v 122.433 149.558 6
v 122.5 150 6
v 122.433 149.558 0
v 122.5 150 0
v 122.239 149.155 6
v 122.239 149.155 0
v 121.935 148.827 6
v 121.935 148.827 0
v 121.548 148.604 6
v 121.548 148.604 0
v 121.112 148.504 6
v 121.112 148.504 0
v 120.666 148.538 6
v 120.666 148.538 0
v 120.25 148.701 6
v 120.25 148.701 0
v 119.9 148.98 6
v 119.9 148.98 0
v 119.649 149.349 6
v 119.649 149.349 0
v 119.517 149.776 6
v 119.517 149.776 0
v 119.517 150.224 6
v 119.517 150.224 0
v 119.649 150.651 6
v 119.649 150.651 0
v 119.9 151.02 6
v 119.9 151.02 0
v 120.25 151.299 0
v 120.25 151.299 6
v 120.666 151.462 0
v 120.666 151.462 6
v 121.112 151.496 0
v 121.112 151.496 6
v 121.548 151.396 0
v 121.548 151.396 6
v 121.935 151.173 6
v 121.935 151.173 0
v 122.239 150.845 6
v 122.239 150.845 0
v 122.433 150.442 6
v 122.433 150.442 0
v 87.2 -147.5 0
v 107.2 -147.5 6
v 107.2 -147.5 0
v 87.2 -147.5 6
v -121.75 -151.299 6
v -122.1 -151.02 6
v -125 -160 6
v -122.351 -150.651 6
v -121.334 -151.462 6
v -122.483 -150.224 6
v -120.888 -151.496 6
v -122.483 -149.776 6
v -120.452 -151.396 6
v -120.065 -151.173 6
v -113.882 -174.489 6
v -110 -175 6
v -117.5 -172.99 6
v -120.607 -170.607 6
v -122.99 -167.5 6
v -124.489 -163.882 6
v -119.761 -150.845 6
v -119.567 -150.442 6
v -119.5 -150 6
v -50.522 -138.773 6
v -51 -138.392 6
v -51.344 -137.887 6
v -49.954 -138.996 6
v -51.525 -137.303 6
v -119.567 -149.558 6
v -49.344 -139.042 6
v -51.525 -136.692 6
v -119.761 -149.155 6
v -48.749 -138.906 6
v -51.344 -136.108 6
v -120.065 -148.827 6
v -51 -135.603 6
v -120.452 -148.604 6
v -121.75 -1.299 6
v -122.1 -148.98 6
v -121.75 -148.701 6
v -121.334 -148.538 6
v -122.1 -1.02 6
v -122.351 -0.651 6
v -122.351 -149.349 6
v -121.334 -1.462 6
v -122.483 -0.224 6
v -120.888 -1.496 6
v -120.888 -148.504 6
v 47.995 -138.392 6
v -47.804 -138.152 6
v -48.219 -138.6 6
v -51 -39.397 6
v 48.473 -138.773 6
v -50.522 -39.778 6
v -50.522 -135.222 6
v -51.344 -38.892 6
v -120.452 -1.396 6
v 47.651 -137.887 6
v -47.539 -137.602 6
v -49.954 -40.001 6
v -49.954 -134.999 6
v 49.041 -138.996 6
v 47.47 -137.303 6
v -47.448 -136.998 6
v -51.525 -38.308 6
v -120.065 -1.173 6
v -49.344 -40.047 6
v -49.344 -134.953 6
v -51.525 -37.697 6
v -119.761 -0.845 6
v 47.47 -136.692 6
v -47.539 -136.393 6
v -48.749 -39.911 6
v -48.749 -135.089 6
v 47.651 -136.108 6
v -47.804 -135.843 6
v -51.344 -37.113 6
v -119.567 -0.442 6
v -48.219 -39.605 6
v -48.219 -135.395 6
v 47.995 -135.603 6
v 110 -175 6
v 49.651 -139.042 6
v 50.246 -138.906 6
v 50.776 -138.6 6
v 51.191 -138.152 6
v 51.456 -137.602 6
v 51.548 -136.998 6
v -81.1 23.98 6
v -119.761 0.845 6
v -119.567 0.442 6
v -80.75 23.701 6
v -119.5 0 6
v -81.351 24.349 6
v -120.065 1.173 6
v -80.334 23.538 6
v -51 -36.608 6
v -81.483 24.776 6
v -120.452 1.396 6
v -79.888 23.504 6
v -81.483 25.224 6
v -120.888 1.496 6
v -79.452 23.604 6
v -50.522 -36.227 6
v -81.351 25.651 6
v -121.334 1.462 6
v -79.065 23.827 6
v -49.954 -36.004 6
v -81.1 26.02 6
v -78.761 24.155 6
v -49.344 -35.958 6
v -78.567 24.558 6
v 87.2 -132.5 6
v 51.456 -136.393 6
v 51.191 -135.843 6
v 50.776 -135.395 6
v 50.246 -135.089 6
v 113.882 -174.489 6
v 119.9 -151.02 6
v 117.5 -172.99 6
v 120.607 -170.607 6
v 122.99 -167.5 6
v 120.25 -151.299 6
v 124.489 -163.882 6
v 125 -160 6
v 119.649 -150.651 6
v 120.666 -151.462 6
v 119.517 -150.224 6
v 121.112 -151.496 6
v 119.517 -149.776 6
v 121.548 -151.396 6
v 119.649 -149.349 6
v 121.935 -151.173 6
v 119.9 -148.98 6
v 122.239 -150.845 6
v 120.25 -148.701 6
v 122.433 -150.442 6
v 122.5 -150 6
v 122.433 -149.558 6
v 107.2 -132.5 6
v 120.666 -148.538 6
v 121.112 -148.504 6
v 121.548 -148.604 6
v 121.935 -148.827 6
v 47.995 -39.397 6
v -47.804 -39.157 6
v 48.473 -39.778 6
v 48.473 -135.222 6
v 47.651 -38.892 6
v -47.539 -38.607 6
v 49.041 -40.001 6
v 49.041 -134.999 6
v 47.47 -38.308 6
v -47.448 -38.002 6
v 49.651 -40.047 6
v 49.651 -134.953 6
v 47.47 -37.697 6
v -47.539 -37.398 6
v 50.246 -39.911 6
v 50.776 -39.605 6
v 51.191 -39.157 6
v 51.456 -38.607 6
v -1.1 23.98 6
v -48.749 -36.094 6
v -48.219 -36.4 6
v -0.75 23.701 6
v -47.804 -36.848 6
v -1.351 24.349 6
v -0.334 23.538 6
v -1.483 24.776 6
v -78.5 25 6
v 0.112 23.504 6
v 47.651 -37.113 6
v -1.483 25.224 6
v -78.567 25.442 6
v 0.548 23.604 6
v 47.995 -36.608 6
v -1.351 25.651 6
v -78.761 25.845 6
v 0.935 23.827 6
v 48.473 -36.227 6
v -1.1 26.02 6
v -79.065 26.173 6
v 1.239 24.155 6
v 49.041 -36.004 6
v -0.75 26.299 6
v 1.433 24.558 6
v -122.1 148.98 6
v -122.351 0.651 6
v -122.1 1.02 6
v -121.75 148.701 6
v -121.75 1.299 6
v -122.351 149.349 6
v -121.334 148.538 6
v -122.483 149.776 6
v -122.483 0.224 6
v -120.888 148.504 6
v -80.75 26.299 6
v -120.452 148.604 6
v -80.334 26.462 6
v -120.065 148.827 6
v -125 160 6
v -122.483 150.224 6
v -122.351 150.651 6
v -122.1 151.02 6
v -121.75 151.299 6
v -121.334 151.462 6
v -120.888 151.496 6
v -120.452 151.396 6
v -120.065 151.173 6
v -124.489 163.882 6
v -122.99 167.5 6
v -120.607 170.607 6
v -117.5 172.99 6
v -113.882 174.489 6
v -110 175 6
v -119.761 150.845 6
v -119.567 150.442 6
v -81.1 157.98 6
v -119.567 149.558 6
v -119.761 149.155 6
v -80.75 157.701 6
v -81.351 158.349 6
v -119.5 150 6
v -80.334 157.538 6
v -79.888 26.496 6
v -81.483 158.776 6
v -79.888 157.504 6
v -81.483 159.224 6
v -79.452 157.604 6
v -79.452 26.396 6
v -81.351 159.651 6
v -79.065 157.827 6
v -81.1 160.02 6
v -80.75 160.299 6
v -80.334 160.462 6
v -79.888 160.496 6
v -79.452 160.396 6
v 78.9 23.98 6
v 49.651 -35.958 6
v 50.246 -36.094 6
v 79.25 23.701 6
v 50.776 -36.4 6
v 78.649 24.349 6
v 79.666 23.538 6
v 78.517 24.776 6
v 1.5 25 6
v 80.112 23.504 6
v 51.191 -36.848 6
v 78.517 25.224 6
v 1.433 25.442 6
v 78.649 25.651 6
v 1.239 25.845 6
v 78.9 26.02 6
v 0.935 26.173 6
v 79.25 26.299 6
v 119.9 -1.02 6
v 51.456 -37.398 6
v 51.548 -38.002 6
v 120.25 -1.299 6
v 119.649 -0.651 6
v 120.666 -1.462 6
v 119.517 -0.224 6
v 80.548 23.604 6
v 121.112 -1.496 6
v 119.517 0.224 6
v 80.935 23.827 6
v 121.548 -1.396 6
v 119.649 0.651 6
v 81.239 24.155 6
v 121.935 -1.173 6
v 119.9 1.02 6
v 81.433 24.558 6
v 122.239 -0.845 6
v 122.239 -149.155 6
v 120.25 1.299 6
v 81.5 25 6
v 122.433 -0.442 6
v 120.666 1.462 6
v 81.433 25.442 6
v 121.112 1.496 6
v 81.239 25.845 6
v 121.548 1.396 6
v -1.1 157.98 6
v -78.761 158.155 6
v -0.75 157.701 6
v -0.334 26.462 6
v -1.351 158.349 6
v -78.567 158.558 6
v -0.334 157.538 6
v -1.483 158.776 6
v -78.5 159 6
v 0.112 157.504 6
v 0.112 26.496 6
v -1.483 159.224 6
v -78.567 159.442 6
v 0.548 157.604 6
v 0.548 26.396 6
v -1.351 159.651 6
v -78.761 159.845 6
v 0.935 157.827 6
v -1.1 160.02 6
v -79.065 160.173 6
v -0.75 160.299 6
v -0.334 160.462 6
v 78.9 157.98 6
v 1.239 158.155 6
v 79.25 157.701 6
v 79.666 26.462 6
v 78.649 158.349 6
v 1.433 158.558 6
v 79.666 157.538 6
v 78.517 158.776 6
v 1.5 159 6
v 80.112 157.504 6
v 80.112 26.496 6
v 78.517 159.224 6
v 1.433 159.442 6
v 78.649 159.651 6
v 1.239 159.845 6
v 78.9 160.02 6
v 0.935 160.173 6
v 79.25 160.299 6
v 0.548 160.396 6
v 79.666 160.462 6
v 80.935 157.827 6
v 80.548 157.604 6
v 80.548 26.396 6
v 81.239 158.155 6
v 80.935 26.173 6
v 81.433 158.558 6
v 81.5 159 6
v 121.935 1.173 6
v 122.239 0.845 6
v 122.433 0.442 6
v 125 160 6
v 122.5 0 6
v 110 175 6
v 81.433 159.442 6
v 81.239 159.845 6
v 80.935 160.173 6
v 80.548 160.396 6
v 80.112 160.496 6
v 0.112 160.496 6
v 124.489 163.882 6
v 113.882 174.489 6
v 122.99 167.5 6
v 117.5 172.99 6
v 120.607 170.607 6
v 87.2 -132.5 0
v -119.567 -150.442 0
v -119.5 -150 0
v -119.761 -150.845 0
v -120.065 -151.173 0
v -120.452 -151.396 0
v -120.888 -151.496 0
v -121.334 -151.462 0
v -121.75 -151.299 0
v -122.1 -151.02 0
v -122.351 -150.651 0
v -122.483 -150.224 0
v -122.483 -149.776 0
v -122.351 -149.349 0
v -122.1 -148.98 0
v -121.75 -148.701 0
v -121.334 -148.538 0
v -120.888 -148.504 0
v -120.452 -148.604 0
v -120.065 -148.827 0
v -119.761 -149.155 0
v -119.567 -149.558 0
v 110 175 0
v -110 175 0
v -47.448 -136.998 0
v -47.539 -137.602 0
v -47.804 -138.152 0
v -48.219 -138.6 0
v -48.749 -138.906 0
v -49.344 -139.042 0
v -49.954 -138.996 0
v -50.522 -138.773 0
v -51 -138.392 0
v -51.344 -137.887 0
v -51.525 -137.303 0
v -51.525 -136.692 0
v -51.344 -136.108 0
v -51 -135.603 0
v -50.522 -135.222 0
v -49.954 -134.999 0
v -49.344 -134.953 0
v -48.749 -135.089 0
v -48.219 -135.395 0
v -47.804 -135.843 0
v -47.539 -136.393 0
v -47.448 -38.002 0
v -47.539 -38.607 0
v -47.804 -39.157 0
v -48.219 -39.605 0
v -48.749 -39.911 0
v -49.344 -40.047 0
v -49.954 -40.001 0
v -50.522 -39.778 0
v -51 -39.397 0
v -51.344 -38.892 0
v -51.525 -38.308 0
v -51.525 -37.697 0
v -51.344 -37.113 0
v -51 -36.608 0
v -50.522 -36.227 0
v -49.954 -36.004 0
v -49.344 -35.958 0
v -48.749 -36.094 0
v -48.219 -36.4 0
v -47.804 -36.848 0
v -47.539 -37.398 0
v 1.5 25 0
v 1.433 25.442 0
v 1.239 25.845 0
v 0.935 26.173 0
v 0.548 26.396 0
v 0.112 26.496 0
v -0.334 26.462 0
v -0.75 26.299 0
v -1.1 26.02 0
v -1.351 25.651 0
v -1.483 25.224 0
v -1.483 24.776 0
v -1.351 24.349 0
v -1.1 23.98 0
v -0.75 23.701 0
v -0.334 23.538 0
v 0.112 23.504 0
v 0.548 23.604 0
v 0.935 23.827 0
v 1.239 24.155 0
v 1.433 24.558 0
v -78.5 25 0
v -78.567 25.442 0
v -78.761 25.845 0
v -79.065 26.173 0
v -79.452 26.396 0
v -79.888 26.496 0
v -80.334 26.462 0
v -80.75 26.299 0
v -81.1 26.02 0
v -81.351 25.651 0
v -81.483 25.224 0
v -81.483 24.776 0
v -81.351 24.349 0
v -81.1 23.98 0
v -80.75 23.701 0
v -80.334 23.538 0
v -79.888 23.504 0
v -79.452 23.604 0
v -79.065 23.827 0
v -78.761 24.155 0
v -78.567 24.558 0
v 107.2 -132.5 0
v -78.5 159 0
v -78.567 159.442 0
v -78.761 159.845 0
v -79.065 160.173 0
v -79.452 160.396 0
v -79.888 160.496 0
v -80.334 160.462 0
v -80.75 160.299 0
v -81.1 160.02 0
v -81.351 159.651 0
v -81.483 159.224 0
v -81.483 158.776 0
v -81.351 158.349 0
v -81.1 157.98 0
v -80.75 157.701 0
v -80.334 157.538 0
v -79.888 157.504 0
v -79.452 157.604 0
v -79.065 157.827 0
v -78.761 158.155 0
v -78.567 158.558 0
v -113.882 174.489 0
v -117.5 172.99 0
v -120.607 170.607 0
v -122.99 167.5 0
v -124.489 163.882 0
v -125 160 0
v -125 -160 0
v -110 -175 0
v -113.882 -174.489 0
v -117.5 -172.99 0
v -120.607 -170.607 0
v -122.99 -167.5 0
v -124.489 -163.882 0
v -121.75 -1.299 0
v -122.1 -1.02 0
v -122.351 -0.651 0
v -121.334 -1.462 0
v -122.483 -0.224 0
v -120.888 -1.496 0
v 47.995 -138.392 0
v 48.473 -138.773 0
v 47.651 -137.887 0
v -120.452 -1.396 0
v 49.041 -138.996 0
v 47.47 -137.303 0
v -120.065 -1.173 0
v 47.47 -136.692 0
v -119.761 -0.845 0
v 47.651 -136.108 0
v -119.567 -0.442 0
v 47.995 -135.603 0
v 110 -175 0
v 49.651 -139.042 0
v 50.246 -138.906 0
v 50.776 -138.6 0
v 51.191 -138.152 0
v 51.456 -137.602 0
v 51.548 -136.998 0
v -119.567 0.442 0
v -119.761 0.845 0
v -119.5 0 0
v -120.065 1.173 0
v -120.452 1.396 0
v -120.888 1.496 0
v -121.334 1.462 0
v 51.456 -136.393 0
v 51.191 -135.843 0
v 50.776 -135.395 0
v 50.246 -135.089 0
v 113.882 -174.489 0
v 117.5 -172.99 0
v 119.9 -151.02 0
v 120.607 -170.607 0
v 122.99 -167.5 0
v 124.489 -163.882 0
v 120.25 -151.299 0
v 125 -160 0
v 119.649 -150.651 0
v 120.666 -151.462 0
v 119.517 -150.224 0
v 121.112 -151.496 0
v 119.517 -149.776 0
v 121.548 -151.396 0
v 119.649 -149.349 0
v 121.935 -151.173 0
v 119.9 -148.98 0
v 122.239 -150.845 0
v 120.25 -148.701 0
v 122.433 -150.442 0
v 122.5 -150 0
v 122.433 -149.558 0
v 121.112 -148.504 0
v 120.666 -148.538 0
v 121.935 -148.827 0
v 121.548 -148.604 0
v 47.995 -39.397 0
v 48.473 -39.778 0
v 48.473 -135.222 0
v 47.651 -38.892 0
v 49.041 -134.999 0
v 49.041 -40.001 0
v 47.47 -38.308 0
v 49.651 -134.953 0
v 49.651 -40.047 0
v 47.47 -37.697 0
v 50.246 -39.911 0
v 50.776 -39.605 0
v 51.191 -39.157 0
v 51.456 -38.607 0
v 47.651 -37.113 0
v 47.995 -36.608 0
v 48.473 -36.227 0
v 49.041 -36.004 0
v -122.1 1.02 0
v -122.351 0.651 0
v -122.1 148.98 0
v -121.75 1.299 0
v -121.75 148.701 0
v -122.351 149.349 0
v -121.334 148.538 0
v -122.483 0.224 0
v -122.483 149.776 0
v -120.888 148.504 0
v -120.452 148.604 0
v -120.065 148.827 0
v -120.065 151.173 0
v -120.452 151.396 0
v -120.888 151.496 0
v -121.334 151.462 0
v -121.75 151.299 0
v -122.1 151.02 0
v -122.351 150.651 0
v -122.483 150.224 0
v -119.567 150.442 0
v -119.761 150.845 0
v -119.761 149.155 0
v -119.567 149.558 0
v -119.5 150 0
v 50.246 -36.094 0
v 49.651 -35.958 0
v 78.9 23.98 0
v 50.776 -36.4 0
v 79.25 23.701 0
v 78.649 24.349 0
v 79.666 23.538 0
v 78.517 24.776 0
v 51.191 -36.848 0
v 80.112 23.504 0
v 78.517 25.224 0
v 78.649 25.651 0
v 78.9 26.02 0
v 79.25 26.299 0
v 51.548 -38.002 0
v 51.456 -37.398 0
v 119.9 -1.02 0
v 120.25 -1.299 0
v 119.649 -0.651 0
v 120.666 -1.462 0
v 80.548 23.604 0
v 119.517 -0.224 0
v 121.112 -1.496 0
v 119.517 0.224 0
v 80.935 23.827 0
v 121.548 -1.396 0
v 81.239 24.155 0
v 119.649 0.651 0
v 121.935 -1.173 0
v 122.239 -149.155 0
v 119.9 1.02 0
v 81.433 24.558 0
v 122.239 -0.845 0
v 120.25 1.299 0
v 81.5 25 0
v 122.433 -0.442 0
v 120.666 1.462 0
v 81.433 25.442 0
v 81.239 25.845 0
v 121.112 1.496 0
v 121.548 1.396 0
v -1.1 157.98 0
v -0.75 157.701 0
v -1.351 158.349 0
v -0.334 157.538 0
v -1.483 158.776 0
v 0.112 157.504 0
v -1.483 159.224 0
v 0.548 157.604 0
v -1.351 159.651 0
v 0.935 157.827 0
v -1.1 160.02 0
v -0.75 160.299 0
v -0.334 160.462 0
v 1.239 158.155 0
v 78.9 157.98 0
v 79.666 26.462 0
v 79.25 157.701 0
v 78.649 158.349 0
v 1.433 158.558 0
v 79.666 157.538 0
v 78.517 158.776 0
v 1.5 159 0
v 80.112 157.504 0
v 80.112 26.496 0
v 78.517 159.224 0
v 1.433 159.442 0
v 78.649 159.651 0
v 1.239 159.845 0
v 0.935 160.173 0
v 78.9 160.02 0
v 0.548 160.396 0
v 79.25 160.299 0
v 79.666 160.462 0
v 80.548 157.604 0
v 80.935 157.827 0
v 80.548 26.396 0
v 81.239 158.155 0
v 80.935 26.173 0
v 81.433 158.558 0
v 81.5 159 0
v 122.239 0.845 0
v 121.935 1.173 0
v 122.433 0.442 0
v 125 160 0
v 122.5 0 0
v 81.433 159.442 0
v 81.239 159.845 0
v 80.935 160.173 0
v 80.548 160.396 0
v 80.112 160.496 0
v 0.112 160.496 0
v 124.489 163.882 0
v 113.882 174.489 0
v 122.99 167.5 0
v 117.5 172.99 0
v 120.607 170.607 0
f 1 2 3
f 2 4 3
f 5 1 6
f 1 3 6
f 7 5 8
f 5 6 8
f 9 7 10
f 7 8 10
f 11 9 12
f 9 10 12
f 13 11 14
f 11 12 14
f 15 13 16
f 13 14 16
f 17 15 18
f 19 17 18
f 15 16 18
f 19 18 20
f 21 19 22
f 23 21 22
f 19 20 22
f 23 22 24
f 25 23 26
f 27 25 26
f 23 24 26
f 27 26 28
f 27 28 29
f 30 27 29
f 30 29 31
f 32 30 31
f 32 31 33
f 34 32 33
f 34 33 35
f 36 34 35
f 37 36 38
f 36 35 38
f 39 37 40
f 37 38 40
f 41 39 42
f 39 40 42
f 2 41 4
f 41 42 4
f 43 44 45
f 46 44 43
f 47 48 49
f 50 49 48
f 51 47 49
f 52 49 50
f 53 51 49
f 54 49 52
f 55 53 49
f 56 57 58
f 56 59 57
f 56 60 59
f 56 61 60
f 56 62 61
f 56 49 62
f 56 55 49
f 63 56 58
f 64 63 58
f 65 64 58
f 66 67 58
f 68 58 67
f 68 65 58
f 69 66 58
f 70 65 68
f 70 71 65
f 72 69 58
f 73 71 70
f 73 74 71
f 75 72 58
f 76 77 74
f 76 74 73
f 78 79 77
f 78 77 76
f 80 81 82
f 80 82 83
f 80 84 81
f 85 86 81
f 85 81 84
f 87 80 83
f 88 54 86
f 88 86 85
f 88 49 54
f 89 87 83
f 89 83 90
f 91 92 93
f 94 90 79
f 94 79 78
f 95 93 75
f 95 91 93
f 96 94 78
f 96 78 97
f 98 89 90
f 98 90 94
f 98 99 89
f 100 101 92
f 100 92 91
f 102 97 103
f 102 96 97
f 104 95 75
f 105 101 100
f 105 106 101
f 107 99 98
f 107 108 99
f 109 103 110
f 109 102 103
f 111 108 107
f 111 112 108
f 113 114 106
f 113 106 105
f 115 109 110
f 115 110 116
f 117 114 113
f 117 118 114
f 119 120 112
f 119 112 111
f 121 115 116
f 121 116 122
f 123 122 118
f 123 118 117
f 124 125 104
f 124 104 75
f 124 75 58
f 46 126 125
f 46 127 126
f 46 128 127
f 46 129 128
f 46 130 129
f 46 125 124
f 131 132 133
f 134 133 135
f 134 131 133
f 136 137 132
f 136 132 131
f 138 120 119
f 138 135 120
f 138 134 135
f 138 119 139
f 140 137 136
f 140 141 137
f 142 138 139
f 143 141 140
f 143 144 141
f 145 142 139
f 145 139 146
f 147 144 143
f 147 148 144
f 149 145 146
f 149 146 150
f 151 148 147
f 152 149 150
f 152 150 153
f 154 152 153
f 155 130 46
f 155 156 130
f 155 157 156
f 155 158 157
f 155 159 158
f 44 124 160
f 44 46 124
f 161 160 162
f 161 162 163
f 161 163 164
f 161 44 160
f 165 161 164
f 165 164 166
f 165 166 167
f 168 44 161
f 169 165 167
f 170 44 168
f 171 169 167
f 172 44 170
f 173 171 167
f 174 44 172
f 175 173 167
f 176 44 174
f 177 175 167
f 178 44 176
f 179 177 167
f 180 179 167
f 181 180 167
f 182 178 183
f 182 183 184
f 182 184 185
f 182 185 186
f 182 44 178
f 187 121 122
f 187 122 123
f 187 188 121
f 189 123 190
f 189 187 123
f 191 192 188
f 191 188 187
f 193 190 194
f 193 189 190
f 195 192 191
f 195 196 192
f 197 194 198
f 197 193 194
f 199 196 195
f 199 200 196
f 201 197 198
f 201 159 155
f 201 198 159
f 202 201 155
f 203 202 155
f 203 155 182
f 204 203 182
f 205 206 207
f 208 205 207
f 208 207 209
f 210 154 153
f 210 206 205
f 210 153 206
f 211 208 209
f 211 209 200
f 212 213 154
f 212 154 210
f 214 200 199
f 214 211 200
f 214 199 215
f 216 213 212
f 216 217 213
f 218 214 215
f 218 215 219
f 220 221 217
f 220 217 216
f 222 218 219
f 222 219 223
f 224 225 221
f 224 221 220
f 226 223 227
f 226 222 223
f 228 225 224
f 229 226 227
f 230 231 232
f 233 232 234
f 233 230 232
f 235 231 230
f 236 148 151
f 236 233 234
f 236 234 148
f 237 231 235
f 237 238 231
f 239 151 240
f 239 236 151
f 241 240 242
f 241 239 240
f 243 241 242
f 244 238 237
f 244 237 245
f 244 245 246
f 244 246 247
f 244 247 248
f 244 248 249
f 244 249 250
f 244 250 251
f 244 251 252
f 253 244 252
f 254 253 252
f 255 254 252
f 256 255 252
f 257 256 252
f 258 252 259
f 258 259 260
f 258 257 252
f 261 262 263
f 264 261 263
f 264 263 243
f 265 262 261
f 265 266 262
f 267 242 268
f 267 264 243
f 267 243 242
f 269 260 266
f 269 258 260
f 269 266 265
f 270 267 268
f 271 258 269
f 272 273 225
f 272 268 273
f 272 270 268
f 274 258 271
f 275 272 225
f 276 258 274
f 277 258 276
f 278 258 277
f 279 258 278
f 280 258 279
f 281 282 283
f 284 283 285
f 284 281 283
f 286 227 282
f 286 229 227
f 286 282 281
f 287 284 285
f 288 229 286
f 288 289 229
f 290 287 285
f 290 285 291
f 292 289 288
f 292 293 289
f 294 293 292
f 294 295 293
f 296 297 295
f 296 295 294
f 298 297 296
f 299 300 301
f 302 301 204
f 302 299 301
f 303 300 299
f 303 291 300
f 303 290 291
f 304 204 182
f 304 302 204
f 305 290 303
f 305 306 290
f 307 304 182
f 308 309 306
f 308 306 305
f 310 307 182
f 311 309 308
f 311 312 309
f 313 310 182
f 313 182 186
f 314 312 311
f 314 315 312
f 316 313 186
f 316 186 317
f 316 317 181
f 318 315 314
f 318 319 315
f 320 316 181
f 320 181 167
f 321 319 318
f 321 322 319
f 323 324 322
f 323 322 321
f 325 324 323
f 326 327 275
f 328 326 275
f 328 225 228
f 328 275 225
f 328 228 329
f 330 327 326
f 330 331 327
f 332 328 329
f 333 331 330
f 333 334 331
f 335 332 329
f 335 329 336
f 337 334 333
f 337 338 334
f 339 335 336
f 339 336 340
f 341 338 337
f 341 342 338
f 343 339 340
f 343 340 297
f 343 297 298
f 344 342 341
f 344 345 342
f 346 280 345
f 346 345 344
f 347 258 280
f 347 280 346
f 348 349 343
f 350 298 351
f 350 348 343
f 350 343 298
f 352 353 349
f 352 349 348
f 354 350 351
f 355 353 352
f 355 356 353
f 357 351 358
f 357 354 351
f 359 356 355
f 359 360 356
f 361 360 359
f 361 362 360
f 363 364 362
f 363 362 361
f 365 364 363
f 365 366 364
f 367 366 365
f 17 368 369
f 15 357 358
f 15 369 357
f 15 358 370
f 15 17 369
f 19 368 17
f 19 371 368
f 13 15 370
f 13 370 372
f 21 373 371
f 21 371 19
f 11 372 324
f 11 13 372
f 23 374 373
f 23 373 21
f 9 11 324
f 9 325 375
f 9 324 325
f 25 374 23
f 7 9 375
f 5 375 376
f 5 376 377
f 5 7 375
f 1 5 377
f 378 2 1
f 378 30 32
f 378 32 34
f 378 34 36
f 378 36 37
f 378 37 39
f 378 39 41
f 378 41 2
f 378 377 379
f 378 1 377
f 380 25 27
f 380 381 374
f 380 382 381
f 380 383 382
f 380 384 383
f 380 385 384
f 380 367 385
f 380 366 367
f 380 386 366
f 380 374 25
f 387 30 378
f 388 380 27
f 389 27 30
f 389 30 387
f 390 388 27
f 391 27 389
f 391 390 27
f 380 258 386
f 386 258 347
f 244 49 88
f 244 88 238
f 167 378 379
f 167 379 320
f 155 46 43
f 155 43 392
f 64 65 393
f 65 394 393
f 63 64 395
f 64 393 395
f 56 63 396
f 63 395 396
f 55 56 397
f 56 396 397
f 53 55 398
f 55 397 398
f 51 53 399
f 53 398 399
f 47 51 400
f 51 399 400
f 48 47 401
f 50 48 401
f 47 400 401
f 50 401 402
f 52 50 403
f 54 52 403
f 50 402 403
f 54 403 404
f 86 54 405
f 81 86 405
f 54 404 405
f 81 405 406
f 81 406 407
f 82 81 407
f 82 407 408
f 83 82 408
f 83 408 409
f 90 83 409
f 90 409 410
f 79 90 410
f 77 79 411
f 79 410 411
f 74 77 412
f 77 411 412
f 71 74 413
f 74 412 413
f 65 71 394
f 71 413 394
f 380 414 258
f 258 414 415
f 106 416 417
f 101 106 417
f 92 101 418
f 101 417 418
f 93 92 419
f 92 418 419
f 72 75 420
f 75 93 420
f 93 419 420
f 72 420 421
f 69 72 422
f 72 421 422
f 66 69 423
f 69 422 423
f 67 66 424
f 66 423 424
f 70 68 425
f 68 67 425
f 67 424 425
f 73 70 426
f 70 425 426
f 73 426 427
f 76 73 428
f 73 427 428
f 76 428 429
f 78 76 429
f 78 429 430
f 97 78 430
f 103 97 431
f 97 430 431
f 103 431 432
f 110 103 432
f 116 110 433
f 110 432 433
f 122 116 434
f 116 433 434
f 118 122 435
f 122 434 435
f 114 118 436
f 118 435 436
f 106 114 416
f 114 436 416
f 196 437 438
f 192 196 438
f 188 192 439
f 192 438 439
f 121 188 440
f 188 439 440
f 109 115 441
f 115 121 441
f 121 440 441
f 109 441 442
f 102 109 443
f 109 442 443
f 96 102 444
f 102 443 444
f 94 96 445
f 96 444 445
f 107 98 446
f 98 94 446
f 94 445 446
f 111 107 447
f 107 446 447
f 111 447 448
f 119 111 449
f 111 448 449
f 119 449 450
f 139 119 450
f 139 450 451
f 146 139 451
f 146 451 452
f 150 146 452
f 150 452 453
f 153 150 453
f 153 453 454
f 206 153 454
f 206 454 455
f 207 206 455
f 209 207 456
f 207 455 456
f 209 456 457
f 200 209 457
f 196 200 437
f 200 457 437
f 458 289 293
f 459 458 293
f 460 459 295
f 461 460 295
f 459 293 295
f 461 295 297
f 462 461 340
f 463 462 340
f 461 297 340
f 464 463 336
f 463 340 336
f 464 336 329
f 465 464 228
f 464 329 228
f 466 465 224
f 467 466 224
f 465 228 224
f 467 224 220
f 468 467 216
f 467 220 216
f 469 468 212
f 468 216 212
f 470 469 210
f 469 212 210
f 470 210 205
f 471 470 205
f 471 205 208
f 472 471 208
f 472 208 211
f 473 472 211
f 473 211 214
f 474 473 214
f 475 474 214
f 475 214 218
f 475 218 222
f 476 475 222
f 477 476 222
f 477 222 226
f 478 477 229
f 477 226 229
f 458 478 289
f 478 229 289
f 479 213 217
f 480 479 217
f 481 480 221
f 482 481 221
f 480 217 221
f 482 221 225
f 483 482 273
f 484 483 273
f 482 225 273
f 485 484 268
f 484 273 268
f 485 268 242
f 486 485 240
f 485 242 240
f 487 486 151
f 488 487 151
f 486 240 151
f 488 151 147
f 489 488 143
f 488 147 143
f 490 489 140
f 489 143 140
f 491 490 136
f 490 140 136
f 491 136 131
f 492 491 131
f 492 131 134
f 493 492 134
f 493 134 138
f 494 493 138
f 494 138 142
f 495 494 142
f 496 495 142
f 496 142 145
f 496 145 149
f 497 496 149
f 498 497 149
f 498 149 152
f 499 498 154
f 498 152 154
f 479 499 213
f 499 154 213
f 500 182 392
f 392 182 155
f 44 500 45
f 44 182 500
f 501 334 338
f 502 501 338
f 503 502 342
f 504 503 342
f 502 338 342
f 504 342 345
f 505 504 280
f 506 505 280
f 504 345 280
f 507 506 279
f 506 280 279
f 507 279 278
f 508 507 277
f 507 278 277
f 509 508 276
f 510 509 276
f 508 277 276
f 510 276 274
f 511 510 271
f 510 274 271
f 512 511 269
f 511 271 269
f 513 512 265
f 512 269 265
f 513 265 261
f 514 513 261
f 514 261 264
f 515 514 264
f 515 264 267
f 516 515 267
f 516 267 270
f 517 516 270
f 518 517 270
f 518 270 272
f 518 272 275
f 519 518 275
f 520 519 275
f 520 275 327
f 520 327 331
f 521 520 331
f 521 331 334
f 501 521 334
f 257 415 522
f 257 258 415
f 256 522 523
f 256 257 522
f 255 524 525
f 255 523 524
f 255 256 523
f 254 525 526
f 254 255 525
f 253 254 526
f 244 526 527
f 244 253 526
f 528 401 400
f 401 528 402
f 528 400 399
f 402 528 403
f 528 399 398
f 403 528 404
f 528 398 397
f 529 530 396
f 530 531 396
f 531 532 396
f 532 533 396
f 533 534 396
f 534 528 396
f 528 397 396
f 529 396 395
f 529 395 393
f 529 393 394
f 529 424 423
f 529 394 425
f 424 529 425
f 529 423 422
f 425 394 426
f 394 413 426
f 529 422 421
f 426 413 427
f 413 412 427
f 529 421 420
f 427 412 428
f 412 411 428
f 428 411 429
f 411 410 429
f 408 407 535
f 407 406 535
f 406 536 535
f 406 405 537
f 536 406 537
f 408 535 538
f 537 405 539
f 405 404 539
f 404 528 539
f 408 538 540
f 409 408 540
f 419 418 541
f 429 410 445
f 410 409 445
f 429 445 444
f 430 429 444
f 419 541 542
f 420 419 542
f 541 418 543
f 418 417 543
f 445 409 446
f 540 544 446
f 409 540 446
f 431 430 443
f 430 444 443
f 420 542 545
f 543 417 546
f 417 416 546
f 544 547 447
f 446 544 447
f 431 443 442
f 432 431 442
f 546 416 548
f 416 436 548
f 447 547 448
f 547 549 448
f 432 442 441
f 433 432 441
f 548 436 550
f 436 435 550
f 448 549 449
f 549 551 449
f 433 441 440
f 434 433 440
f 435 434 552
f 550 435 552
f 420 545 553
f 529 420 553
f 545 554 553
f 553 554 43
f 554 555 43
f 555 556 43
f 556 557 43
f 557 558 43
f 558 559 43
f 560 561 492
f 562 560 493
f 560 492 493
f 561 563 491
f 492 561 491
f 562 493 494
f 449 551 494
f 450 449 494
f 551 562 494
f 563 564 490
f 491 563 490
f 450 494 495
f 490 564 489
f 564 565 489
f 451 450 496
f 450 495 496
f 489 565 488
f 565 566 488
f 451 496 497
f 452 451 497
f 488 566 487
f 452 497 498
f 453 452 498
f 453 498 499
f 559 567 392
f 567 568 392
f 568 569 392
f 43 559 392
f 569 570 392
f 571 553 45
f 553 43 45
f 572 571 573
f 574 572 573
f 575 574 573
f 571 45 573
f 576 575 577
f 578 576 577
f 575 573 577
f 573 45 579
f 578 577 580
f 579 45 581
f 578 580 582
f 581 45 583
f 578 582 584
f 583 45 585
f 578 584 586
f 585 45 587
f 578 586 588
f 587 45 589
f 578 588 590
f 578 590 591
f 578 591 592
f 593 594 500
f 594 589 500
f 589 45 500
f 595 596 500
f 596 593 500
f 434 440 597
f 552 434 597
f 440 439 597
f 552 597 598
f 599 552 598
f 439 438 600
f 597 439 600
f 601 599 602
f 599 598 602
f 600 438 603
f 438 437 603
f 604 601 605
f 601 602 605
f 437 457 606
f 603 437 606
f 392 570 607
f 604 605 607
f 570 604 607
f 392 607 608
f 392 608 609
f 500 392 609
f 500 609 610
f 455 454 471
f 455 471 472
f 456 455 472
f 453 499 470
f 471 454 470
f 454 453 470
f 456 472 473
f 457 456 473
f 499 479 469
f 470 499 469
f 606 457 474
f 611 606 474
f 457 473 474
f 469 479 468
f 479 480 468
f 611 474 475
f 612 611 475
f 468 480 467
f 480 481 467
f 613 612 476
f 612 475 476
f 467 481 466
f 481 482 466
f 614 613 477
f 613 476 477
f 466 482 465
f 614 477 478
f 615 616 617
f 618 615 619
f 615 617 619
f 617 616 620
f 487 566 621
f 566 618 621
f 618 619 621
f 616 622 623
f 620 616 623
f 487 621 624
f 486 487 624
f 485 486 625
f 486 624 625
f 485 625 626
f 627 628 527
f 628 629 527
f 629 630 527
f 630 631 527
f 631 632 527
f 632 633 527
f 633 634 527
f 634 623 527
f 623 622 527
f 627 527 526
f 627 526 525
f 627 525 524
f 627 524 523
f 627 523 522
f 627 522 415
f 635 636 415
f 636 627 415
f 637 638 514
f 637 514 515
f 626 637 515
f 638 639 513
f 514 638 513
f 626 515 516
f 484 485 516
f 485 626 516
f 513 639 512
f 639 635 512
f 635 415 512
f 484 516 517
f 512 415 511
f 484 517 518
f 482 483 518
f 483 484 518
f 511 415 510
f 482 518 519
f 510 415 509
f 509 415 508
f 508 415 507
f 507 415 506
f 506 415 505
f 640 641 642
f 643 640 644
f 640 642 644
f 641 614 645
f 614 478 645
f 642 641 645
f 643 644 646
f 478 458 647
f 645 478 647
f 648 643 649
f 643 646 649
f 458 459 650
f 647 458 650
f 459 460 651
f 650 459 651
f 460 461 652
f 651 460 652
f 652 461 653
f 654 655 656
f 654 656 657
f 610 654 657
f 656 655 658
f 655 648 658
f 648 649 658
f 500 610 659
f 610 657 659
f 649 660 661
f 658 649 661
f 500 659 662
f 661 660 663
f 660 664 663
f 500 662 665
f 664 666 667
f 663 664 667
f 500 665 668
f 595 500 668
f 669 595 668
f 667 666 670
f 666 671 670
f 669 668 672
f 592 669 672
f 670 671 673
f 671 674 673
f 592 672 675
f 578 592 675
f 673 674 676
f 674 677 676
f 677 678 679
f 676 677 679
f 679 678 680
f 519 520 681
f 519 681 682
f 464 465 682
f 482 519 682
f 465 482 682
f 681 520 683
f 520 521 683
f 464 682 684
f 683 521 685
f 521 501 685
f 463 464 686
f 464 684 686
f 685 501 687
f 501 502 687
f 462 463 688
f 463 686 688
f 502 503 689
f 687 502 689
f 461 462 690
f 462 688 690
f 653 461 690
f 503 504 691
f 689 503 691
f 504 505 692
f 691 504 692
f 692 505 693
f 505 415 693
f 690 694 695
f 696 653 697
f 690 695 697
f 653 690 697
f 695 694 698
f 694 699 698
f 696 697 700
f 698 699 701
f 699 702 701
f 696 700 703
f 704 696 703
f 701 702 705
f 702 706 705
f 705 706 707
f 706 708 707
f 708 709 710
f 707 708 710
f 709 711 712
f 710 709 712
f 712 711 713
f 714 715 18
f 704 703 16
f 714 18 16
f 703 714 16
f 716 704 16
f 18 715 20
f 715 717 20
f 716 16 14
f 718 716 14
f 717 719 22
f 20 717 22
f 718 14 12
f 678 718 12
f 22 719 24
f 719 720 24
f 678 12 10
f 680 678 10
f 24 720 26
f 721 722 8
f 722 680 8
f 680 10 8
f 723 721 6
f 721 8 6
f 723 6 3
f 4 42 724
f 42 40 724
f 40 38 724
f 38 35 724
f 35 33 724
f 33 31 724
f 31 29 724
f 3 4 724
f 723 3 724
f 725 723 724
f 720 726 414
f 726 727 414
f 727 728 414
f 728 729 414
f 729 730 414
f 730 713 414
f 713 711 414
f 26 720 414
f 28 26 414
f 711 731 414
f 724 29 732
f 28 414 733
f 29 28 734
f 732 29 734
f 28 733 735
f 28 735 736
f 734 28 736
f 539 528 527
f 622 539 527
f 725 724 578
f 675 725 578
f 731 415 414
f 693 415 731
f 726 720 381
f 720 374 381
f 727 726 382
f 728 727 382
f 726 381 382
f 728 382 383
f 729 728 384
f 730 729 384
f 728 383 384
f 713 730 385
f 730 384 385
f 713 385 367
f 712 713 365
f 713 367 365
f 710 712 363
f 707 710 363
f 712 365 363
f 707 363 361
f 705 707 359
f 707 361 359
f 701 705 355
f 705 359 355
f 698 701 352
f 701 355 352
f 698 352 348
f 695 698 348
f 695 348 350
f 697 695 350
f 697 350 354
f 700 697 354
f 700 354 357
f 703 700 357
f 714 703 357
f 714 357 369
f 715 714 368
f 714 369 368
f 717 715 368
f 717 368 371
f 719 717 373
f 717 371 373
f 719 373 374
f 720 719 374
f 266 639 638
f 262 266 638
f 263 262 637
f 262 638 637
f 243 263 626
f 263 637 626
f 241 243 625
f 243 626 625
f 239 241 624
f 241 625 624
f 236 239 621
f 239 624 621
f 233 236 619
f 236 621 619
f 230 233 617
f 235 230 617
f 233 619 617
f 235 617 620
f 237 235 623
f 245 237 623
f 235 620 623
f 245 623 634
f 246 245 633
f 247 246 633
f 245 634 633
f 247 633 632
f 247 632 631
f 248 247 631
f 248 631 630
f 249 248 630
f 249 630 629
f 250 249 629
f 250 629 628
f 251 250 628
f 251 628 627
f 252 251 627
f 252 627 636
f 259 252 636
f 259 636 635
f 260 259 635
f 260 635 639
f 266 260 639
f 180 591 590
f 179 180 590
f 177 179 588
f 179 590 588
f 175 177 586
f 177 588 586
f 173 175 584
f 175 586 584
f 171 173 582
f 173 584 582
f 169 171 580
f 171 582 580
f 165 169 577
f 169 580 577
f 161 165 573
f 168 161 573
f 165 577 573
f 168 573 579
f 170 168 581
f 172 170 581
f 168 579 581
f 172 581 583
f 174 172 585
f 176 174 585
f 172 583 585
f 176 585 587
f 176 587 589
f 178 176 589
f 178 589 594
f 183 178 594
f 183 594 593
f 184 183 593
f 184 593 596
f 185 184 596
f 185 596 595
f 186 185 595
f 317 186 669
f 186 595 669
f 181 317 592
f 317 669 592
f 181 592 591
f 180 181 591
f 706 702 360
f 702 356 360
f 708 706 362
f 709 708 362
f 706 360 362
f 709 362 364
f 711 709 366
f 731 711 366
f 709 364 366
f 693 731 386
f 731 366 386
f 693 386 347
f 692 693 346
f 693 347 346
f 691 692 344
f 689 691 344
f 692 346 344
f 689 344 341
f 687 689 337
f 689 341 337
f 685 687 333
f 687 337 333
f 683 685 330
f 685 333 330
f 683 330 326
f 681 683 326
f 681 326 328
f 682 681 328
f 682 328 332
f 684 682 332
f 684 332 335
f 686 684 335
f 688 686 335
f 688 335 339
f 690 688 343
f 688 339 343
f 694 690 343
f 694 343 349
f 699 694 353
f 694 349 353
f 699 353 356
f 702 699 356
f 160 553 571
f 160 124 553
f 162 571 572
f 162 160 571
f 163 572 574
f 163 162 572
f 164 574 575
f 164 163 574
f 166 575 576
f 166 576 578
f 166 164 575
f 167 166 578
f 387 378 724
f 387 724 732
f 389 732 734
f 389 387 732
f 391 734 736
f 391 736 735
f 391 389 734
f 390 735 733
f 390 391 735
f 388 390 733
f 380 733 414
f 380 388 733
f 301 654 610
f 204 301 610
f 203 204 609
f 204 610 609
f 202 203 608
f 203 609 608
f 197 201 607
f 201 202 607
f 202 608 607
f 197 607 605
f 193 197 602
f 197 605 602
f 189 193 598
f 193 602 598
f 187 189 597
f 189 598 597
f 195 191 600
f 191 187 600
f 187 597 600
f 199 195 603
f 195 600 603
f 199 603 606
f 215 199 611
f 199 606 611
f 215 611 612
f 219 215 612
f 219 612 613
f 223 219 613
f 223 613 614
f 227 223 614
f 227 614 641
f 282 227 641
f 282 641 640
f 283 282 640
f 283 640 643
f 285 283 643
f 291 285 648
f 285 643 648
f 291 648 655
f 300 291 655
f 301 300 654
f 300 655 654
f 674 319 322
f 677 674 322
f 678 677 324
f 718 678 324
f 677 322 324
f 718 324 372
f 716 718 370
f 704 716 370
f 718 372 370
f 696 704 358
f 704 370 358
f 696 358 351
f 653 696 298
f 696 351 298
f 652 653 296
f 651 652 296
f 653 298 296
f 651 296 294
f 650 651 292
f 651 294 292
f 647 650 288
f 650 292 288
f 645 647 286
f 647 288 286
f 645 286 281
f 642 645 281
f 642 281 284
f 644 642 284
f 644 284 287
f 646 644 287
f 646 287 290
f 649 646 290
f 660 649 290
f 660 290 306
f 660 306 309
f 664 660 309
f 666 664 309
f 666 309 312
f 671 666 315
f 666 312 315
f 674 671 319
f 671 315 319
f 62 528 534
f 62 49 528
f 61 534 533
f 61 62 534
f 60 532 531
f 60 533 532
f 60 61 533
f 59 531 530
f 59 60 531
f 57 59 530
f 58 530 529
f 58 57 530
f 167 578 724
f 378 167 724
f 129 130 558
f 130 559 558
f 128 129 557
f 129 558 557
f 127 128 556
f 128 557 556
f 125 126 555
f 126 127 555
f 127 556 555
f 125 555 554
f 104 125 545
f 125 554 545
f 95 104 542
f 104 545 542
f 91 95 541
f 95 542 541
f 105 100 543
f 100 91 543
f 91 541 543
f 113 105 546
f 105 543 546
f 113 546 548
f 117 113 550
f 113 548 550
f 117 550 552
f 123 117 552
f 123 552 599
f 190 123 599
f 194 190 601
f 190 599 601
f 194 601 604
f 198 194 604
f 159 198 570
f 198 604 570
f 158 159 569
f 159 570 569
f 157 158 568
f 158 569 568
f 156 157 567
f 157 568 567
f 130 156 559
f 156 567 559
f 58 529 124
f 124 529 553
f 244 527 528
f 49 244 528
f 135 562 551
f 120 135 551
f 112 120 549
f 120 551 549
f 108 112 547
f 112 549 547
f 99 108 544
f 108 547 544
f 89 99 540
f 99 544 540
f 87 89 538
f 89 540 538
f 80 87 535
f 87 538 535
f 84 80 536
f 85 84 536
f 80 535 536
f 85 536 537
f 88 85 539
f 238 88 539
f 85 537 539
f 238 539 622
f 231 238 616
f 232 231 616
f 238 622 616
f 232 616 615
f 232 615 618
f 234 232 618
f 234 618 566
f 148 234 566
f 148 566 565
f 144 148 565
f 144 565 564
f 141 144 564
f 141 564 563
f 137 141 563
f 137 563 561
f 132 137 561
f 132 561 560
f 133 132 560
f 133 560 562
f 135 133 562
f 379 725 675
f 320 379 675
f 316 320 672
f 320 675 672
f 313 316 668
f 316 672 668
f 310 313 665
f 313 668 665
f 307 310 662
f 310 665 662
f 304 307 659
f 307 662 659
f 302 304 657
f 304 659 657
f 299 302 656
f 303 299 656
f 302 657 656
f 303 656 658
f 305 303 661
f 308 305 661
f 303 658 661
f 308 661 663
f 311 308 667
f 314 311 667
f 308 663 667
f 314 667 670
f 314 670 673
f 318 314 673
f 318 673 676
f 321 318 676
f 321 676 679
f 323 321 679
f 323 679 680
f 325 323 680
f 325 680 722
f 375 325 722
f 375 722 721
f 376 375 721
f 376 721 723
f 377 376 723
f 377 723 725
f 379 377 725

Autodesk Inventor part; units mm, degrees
ref_plane "YZ Plane" through (0, 0, 0) normal (1, 0, 0) x (0, 1, 0)
ref_plane "XZ Plane" through (0, 0, 0) normal (0, 1, 0) x (-1, 0, 0)
ref_plane "XY Plane" through (0, 0, 0) normal (0, 0, 1) x (1, 0, 0)
sketch "Sketch1" plane through (0, 0, 0) normal (0, 0, 1) x (1, 0, 0)
  line L0 (-125, -175) -> (125, -175)
  line L1 (125, -175) -> (125, 175)
  line L2 (125, 175) -> (-125, 175)
  line L3 (-125, 175) -> (-125, -175)
  line L4 (-125, -175) -> (125, 175) construction
  line L5 (125, -175) -> (-125, 175) construction
  line L6 (-121, -150) -> (121, -150)
  line L7 (121, -150) -> (121, 150)
  line L8 (121, 150) -> (-121, 150)
  line L9 (-121, 150) -> (-121, -150)
  line L10 (-121, -150) -> (121, 150) construction
  line L11 (121, -150) -> (-121, 150) construction
  circle A0 centre (121, 150) radius 1.5
  circle A1 centre (-121, 150) radius 1.5
  circle A2 centre (-121, -150) radius 1.5
  circle A3 centre (121, -150) radius 1.5
  circle A4 centre (-121, 0) radius 1.5
  circle A5 centre (121, 0) radius 1.5
  line L12 (0, 0) -> (0, -175)
  line L13 (-125, 0) -> (125, -175)
  line L14 (125, 0) -> (-125, -175)
  circle A6 centre (49.4975, -38.0025) radius 2.05
  circle A7 centre (-49.4975, -38.0025) radius 2.05
  circle A8 centre (49.4975, -136.9975) radius 2.05
  circle A9 centre (-49.4975, -136.9975) radius 2.05
  point P0 (121, -148.5)
  point P1 (119.5, -150)
  point P2 (119.5, 150)
  point P3 (121, 148.5)
  point P4 (-121, 148.5)
  point P5 (-119.5, 150)
  point P6 (0, -87.5)
  dimension "d0" = 250
  dimension "d1" = 350
  dimension "d10" = 242
  dimension "d11" = 300
  dimension "d12" = 3
  dimension "d13" = 3
  dimension "d14" = 3
  dimension "d15" = 3
  dimension "d16" = 3
  dimension "d17" = 3
  dimension "d24" = 4.1
  dimension "d25" = 4.1
  dimension "d26" = 4.1
  dimension "d27" = 4.1
extrude "Extrusion1" add sketch "Sketch1" along normal blind 6 contours L14 L6 L12 L0 | L3 L13 L9 A2 L6 L14 | L12 L6 L13 L0 | L3 L2 L1 L14 L7 A5 A0 L8 A1 L9 A4 L13 | L14 L12 L6 | L6 A2 L9 L13 L14 | L13 L6 A3 L7 L14 L1 | L12 L13 L6 | L9 A4 A1 L8 A0 L7 A5 L14 L13 | L14 L7 A3 L6 L13
fillet "Fillet1" radius 15 4 edges at (125, 175, 3) (125, -175, 3) (-125, -175, 3) (-125, 175, 3)
sketch "Sketch2" plane through (0, 0, 6) normal (0, 0, 1) x (1, 0, 0)
  line L0 (90, -127.5) -> (104.4, -127.5)
  line L1 (87.2, -127.5) -> (107.2, -127.5)
  line L2 (87.2, -127.5) -> (107.2, -127.5)
  line L3 (107.2, -127.5) -> (107.2, -147.5)
  line L4 (107.2, -147.5) -> (87.2, -147.5)
  line L5 (87.2, -147.5) -> (87.2, -127.5)
  line L6 (87.2, -147.5) -> (107.2, -147.5)
  line L7 (107.2, -147.5) -> (107.2, -132.5)
  line L8 (107.2, -132.5) -> (87.2, -132.5)
  line L9 (87.2, -132.5) -> (87.2, -147.5)
  point P0 (0, 0)
  point P1 (97.2, -127.5)
  dimension "d28" = 20
  dimension "d29" = 20
  dimension "d30" = 20
  dimension "d31" = 20
  dimension "d32" = 15
extrude "Extrusion2" cut sketch "Sketch2" against normal through all contours L8 L3 L4 L5
sketch "Sketch3" plane through (0, 0, 6) normal (0, 0, 1) x (1, 0, 0)
  circle A0 centre (80, 25) radius 1.5 projected
  circle A1 centre (0, 25) radius 1.5 projected
  circle A2 centre (-80, 25) radius 1.5 projected
  circle A3 centre (-80, 159) radius 1.5 projected
  circle A4 centre (0, 159) radius 1.5 projected
  circle A5 centre (80, 159) radius 1.5 projected
  point P0 (0, 0)
extrude "Extrusion3" cut sketch "Sketch3" against normal through all
properties part number "manipulation layer"
